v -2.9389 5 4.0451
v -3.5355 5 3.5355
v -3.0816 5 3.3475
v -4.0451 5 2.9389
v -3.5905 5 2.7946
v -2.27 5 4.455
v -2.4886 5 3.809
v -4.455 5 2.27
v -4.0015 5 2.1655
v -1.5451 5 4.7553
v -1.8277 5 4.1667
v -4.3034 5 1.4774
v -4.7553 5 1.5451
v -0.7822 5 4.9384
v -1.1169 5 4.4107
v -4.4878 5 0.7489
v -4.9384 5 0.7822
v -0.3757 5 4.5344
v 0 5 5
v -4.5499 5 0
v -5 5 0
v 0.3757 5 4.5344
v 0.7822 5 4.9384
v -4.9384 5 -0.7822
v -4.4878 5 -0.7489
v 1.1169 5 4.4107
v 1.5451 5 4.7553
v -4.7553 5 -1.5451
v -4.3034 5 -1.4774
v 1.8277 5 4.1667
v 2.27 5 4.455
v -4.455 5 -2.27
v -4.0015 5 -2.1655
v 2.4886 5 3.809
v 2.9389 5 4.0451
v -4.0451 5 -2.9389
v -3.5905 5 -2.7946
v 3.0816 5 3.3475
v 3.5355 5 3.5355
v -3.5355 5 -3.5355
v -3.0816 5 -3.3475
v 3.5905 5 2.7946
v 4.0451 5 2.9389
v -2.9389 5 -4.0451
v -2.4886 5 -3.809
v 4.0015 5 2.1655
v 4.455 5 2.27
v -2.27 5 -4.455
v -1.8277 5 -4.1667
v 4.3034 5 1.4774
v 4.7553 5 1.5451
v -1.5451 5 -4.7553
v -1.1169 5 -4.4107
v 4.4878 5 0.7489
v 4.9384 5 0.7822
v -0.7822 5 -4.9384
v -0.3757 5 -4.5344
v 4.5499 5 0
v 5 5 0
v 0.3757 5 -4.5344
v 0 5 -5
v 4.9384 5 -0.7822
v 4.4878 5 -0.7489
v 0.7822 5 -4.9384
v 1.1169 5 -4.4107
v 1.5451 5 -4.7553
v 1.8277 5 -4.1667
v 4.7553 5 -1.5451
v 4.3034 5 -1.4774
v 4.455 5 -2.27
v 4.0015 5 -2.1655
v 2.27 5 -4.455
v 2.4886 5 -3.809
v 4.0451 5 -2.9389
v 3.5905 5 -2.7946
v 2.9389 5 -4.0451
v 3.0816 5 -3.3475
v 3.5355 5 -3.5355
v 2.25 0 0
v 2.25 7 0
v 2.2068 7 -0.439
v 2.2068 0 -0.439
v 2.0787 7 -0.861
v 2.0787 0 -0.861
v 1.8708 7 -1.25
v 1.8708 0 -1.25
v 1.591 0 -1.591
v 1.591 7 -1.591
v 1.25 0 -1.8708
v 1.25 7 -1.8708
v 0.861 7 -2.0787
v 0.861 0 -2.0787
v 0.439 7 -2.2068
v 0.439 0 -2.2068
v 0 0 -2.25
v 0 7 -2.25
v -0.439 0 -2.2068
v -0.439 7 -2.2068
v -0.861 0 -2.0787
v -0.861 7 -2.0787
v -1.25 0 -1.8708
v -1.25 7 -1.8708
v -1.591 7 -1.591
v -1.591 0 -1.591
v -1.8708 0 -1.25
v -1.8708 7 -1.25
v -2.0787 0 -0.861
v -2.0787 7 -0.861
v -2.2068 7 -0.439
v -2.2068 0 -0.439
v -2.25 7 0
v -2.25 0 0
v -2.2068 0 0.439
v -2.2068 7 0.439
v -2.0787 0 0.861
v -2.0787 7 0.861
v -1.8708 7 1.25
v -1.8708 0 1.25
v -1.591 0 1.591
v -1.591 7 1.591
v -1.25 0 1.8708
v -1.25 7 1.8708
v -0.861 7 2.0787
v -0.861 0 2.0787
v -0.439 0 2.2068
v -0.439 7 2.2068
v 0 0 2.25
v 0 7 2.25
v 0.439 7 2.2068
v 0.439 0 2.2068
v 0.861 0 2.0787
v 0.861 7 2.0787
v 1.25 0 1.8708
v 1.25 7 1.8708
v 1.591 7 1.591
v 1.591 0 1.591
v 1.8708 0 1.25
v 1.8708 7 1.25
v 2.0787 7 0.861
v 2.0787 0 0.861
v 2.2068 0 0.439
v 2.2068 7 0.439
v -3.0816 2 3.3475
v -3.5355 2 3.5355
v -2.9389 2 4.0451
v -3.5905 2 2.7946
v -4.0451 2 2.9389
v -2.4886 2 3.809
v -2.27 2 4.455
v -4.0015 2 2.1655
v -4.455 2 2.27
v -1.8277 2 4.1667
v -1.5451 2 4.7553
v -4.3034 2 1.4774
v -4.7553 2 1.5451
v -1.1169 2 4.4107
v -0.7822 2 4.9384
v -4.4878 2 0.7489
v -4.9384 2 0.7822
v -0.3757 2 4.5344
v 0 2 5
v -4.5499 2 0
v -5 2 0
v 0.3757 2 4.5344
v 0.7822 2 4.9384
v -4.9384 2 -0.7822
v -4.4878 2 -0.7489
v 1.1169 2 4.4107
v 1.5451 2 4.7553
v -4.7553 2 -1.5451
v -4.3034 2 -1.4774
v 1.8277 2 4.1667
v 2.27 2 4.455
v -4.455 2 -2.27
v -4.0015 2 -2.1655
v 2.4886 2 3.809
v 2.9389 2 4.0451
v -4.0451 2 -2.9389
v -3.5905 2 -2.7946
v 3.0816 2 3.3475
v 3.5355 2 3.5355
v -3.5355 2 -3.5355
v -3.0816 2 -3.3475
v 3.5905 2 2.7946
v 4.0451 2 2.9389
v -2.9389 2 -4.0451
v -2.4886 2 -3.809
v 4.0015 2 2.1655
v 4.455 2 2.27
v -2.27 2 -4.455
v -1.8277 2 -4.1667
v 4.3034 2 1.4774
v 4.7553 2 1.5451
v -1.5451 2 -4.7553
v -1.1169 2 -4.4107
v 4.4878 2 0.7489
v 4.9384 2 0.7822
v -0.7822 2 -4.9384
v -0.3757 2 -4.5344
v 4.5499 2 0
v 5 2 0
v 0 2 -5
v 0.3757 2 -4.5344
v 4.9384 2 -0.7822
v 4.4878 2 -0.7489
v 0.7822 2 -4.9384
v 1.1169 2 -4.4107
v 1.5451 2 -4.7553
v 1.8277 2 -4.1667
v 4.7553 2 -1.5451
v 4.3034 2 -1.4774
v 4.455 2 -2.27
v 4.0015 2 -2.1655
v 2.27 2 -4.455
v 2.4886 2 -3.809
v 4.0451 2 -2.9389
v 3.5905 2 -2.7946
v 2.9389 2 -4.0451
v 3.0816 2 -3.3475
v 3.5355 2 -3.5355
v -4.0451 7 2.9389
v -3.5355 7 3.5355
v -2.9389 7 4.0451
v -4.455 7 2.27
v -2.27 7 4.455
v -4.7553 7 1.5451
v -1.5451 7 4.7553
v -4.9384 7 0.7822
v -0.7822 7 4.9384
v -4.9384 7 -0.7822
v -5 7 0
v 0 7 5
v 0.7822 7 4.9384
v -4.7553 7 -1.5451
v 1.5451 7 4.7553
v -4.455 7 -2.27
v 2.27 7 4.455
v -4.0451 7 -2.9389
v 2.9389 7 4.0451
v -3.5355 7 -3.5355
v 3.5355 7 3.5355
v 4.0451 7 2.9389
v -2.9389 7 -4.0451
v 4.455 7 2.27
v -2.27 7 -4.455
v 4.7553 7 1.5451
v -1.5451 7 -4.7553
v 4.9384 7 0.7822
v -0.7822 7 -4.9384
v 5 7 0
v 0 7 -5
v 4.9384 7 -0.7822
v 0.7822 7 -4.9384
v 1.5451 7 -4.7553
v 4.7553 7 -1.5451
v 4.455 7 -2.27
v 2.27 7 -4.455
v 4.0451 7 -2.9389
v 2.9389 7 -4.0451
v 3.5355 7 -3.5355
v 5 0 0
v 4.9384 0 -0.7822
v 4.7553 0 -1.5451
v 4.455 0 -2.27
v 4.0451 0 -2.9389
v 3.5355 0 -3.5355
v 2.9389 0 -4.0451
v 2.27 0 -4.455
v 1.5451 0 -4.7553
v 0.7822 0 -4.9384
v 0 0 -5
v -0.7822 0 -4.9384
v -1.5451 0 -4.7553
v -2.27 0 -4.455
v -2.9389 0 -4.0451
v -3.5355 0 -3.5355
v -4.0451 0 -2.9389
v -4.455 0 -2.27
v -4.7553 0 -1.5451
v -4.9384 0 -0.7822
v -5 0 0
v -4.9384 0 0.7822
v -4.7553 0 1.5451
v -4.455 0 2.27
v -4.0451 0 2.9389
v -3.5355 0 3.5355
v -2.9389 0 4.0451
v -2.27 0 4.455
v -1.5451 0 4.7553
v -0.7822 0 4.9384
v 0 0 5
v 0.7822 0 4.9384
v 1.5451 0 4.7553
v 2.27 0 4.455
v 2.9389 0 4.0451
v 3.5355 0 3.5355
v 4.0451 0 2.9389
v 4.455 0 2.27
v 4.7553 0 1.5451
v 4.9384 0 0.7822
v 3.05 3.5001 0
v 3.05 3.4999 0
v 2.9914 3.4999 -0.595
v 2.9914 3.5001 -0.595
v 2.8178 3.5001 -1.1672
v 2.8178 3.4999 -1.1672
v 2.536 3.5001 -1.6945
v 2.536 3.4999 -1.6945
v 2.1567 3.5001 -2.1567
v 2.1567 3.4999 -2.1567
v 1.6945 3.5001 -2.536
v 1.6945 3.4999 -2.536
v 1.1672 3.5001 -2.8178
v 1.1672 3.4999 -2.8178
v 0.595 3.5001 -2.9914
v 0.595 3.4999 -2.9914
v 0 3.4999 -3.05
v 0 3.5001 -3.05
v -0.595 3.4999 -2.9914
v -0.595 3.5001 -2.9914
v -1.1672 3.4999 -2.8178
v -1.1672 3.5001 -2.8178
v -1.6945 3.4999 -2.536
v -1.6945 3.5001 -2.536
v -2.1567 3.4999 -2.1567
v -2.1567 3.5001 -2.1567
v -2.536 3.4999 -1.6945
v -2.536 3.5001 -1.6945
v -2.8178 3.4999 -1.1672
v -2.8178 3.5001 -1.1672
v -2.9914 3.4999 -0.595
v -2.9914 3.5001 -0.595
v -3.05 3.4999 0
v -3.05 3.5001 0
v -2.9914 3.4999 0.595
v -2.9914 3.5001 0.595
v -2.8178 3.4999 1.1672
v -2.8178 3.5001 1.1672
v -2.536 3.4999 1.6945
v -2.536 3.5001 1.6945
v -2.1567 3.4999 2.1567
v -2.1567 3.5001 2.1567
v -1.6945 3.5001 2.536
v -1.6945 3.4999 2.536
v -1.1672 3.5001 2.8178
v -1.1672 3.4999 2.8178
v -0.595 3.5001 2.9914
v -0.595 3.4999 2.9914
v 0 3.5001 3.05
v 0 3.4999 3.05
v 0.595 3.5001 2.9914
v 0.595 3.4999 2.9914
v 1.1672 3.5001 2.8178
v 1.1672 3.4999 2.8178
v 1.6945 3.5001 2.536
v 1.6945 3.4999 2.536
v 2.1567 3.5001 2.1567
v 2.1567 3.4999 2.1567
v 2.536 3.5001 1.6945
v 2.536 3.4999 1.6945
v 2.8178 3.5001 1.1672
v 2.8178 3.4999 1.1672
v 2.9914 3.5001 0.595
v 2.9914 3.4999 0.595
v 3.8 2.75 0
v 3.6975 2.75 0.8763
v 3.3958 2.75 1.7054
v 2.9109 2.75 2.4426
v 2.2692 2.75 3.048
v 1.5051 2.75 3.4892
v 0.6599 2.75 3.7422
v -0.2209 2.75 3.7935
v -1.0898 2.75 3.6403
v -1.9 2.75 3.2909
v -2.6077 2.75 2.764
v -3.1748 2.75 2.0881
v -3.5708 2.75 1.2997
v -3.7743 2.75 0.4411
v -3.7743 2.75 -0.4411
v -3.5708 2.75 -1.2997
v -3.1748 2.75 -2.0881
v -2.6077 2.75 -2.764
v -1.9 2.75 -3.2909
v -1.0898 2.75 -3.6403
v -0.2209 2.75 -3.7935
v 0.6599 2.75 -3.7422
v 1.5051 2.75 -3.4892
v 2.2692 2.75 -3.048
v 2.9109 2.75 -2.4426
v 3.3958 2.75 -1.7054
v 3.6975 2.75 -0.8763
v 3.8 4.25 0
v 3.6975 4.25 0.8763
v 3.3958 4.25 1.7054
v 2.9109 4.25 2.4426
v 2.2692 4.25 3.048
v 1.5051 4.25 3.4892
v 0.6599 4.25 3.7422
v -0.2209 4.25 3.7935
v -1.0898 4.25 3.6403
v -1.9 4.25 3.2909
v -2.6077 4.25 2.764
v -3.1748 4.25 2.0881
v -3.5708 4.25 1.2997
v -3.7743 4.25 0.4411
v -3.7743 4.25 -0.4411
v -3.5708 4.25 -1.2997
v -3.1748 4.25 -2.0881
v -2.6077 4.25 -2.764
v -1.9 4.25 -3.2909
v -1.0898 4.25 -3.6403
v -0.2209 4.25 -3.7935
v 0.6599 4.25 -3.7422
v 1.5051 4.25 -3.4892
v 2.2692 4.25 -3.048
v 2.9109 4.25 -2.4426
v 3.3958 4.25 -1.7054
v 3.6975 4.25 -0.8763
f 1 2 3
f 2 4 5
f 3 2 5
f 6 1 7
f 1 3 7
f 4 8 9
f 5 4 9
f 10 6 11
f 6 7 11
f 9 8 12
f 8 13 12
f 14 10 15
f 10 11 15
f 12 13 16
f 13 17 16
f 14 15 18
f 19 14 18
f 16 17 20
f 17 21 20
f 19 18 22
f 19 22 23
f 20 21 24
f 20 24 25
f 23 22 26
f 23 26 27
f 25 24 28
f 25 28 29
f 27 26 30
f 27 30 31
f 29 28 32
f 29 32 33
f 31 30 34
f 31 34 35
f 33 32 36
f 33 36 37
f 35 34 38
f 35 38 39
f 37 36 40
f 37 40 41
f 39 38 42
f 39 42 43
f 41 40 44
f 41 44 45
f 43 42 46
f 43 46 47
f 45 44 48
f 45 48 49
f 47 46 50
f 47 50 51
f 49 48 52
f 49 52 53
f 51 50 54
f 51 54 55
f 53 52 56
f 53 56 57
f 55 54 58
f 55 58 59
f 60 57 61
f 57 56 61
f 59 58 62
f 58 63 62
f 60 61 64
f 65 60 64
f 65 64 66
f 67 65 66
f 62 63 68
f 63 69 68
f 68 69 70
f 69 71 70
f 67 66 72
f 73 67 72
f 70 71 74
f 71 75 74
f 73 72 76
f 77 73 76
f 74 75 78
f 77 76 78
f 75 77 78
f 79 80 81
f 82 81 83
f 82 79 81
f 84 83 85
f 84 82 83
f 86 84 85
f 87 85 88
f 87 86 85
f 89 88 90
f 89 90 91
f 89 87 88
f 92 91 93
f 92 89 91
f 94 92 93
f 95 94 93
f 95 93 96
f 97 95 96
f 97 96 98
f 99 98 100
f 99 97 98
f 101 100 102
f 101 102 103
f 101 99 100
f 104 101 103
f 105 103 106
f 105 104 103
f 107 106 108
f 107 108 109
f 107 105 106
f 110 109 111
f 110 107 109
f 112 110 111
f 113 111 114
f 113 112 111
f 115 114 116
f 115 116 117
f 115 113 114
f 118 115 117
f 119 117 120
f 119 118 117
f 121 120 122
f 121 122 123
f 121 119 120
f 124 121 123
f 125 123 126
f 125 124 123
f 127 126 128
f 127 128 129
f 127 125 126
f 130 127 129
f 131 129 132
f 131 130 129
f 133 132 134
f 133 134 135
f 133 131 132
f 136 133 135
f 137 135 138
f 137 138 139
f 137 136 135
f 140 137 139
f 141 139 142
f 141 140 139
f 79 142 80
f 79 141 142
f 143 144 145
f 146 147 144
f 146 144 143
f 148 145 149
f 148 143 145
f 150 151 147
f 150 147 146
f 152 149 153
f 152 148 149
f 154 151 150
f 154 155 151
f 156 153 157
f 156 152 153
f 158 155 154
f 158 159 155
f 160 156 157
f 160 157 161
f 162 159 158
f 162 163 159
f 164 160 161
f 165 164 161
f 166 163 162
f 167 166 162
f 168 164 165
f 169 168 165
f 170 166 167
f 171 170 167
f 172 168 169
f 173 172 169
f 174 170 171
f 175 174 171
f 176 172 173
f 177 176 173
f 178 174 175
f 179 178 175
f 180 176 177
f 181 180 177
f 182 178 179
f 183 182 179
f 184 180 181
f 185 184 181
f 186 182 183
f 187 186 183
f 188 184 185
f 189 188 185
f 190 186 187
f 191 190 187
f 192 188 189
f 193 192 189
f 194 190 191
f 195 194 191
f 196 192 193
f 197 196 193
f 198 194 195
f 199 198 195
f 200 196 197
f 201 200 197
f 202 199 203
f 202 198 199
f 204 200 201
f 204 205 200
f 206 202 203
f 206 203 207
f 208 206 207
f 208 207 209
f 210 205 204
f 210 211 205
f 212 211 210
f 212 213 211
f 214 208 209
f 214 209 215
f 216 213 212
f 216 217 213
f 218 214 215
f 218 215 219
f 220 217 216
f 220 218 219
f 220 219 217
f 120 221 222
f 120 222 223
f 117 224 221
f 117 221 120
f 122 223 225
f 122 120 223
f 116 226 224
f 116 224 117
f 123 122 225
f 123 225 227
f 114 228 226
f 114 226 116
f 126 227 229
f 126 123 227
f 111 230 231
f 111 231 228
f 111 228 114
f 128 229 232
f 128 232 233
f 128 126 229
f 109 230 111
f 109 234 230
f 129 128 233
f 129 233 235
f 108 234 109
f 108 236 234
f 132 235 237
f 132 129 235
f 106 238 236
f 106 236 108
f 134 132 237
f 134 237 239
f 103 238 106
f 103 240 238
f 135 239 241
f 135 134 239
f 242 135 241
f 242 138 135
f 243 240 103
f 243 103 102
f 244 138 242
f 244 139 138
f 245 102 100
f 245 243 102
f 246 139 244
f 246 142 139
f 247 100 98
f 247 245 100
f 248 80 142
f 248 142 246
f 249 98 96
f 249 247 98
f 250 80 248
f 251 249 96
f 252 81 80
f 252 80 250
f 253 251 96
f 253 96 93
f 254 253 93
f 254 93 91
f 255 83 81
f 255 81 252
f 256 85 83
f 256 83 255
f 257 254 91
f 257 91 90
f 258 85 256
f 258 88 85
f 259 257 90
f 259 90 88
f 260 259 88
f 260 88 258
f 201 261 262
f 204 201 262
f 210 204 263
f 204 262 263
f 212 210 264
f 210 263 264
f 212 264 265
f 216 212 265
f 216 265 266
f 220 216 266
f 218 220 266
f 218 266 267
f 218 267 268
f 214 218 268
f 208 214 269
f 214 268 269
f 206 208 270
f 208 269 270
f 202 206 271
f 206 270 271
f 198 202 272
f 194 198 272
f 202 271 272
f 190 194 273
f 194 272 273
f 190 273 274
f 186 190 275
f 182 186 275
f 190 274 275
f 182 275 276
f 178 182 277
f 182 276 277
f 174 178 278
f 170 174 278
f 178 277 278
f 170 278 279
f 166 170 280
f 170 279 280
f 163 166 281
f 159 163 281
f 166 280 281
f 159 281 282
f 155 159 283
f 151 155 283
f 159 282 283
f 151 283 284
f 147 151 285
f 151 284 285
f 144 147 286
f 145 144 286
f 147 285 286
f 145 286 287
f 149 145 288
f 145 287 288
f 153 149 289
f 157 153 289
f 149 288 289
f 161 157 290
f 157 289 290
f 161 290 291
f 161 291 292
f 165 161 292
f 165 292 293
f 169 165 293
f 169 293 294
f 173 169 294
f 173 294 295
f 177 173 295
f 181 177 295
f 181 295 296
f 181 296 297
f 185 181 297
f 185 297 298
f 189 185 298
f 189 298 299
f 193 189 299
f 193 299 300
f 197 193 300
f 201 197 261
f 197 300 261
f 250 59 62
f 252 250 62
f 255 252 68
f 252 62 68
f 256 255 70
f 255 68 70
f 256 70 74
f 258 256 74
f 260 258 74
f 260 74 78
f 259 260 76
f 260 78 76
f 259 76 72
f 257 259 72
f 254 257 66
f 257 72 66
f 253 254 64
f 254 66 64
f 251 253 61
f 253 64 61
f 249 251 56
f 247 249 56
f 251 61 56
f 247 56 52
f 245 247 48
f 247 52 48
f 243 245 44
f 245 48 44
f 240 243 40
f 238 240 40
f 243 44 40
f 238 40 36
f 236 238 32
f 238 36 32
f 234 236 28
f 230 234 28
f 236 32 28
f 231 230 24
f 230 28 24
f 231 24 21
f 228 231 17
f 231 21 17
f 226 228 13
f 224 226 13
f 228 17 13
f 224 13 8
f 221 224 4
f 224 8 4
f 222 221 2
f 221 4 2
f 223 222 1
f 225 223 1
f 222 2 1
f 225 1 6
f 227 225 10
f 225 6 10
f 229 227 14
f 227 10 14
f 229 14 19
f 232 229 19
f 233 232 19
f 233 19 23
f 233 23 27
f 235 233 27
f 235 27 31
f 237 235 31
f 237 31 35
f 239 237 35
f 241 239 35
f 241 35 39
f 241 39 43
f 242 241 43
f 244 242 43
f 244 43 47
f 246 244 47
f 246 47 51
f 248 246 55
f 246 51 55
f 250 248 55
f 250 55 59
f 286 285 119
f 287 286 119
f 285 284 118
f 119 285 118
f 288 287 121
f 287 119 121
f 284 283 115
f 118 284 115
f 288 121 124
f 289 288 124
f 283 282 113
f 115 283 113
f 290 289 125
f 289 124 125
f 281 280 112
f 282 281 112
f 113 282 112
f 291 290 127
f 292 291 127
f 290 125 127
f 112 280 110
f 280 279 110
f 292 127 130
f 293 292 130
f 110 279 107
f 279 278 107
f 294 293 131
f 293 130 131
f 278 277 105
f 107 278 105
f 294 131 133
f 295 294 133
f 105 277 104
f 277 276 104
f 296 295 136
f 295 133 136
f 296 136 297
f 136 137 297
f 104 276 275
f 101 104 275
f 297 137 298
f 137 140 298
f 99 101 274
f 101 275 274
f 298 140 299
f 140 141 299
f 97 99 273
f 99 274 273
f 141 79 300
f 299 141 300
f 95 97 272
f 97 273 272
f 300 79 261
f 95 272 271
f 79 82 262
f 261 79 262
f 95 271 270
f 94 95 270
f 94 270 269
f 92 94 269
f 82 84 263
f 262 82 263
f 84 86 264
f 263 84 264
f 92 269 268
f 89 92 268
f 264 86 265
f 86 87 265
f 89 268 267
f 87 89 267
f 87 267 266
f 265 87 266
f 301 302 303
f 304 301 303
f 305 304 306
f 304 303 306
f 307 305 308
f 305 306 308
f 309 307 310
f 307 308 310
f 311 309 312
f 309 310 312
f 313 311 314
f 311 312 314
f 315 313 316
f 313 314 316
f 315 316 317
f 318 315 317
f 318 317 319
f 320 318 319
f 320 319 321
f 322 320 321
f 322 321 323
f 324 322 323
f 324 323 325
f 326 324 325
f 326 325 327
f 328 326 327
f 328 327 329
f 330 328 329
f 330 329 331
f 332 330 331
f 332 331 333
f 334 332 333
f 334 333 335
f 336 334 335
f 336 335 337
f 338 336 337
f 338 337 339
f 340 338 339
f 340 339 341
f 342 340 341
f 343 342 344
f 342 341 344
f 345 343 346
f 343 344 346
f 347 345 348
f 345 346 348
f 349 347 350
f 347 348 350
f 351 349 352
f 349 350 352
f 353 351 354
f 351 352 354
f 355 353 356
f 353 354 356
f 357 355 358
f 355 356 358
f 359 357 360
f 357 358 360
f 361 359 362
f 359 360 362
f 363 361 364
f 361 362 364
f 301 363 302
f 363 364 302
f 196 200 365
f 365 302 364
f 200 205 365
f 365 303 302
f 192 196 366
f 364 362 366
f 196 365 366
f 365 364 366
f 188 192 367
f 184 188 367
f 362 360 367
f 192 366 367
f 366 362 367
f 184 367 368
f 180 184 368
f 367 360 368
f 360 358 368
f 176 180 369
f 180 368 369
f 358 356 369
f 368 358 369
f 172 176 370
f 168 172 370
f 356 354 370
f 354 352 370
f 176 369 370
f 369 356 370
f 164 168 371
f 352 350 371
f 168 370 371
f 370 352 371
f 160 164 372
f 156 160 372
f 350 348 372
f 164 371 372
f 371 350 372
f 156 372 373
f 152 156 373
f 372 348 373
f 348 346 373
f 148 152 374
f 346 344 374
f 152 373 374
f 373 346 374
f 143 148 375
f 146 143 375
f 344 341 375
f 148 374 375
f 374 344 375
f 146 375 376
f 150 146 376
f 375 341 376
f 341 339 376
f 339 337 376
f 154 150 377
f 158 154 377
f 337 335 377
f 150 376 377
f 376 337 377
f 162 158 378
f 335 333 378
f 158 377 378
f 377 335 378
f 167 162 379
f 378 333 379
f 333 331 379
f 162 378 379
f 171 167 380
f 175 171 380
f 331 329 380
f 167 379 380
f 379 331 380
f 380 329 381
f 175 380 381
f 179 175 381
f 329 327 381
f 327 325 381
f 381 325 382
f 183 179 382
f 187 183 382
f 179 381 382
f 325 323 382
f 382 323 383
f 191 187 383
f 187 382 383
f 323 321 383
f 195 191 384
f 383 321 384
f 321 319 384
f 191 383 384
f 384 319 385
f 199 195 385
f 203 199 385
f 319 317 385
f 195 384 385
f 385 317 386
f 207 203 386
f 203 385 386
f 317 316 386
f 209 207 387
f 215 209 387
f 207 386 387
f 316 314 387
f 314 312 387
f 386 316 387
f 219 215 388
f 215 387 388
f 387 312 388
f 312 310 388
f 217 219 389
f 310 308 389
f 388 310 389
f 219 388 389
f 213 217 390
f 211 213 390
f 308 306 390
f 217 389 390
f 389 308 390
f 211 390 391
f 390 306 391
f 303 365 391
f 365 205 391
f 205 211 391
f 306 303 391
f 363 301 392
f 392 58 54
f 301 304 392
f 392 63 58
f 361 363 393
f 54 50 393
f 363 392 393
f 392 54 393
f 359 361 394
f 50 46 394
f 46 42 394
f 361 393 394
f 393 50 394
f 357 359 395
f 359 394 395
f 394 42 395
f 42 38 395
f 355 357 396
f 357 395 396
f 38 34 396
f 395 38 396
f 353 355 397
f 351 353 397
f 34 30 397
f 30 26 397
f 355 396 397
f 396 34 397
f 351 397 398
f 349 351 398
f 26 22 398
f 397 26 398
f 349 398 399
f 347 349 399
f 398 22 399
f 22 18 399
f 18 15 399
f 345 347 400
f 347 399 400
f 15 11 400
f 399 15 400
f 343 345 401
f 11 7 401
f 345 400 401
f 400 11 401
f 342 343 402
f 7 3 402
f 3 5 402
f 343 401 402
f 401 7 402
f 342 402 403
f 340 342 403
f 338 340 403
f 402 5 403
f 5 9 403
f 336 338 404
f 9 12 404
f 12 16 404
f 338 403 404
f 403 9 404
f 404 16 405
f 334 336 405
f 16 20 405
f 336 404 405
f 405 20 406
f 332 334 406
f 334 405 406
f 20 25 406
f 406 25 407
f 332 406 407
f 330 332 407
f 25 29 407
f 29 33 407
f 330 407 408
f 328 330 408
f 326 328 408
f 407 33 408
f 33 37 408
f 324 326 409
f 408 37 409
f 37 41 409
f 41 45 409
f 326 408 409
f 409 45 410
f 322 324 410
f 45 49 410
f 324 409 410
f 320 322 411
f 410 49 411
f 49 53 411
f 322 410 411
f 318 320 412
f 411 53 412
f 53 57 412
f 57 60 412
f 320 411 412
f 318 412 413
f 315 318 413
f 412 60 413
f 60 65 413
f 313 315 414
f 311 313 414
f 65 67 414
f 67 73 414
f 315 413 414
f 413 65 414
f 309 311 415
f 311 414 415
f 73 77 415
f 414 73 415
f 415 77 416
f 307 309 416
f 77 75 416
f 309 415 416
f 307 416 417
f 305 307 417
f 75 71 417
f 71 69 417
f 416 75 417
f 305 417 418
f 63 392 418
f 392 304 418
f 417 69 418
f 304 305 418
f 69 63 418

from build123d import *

# Parameters (mm, degrees)
SKETCH_1_R      = 3.05
SKETCH_1_R_2    = 2.25
EXTRUDE_1_DEPTH = 7
SKETCH_2_R      = 5
SKETCH_2_R_2    = 2.25
EXTRUDE_2_DEPTH = 2
EXTRUDE_START   = -2
SKETCH_3_R      = 5
SKETCH_3_R_2    = 2.25
EXTRUDE_3_DEPTH = 2
CHAMFER_1_SIZE  = 1.5


with BuildPart() as part:
    # Эскиз1 → Вытянуть-Тонкостенный1 (new body)
    with BuildSketch(Plane(origin=(0, 0, 0), x_dir=(1, 0, 0), z_dir=(0, 1, 0))):
        Circle(SKETCH_1_R)
        Circle(SKETCH_1_R_2, mode=Mode.SUBTRACT)
    extrude(amount=EXTRUDE_1_DEPTH)

    # Эскиз2 → Вытянуть-Тонкостенный2 (add)
    with BuildSketch(Plane(origin=(0, 0, 0), x_dir=(1, 0, 0), z_dir=(0, 1, 0))):
        Circle(SKETCH_2_R)
        Circle(SKETCH_2_R_2, mode=Mode.SUBTRACT)
    extrude(amount=EXTRUDE_2_DEPTH)

    # Эскиз3 → Вытянуть-Тонкостенный3 (add)
    with BuildSketch(Plane(origin=(0, 7, 0), x_dir=(1, 0, 0), z_dir=(0, 1, 0)).offset(EXTRUDE_START)):
        Circle(SKETCH_3_R)
        Circle(SKETCH_3_R_2, mode=Mode.SUBTRACT)
    extrude(amount=EXTRUDE_3_DEPTH)

    # Фаска1
    chamfer_1_edges = [part.edges().sort_by_distance(p)[0] for p in [
        (-3.05, 2, 0),
        (-3.05, 5, 0),
    ]]
    chamfer(chamfer_1_edges, length=CHAMFER_1_SIZE - 0.0001)  # a hair under: the kernel refuses the full size


solid = part.part
